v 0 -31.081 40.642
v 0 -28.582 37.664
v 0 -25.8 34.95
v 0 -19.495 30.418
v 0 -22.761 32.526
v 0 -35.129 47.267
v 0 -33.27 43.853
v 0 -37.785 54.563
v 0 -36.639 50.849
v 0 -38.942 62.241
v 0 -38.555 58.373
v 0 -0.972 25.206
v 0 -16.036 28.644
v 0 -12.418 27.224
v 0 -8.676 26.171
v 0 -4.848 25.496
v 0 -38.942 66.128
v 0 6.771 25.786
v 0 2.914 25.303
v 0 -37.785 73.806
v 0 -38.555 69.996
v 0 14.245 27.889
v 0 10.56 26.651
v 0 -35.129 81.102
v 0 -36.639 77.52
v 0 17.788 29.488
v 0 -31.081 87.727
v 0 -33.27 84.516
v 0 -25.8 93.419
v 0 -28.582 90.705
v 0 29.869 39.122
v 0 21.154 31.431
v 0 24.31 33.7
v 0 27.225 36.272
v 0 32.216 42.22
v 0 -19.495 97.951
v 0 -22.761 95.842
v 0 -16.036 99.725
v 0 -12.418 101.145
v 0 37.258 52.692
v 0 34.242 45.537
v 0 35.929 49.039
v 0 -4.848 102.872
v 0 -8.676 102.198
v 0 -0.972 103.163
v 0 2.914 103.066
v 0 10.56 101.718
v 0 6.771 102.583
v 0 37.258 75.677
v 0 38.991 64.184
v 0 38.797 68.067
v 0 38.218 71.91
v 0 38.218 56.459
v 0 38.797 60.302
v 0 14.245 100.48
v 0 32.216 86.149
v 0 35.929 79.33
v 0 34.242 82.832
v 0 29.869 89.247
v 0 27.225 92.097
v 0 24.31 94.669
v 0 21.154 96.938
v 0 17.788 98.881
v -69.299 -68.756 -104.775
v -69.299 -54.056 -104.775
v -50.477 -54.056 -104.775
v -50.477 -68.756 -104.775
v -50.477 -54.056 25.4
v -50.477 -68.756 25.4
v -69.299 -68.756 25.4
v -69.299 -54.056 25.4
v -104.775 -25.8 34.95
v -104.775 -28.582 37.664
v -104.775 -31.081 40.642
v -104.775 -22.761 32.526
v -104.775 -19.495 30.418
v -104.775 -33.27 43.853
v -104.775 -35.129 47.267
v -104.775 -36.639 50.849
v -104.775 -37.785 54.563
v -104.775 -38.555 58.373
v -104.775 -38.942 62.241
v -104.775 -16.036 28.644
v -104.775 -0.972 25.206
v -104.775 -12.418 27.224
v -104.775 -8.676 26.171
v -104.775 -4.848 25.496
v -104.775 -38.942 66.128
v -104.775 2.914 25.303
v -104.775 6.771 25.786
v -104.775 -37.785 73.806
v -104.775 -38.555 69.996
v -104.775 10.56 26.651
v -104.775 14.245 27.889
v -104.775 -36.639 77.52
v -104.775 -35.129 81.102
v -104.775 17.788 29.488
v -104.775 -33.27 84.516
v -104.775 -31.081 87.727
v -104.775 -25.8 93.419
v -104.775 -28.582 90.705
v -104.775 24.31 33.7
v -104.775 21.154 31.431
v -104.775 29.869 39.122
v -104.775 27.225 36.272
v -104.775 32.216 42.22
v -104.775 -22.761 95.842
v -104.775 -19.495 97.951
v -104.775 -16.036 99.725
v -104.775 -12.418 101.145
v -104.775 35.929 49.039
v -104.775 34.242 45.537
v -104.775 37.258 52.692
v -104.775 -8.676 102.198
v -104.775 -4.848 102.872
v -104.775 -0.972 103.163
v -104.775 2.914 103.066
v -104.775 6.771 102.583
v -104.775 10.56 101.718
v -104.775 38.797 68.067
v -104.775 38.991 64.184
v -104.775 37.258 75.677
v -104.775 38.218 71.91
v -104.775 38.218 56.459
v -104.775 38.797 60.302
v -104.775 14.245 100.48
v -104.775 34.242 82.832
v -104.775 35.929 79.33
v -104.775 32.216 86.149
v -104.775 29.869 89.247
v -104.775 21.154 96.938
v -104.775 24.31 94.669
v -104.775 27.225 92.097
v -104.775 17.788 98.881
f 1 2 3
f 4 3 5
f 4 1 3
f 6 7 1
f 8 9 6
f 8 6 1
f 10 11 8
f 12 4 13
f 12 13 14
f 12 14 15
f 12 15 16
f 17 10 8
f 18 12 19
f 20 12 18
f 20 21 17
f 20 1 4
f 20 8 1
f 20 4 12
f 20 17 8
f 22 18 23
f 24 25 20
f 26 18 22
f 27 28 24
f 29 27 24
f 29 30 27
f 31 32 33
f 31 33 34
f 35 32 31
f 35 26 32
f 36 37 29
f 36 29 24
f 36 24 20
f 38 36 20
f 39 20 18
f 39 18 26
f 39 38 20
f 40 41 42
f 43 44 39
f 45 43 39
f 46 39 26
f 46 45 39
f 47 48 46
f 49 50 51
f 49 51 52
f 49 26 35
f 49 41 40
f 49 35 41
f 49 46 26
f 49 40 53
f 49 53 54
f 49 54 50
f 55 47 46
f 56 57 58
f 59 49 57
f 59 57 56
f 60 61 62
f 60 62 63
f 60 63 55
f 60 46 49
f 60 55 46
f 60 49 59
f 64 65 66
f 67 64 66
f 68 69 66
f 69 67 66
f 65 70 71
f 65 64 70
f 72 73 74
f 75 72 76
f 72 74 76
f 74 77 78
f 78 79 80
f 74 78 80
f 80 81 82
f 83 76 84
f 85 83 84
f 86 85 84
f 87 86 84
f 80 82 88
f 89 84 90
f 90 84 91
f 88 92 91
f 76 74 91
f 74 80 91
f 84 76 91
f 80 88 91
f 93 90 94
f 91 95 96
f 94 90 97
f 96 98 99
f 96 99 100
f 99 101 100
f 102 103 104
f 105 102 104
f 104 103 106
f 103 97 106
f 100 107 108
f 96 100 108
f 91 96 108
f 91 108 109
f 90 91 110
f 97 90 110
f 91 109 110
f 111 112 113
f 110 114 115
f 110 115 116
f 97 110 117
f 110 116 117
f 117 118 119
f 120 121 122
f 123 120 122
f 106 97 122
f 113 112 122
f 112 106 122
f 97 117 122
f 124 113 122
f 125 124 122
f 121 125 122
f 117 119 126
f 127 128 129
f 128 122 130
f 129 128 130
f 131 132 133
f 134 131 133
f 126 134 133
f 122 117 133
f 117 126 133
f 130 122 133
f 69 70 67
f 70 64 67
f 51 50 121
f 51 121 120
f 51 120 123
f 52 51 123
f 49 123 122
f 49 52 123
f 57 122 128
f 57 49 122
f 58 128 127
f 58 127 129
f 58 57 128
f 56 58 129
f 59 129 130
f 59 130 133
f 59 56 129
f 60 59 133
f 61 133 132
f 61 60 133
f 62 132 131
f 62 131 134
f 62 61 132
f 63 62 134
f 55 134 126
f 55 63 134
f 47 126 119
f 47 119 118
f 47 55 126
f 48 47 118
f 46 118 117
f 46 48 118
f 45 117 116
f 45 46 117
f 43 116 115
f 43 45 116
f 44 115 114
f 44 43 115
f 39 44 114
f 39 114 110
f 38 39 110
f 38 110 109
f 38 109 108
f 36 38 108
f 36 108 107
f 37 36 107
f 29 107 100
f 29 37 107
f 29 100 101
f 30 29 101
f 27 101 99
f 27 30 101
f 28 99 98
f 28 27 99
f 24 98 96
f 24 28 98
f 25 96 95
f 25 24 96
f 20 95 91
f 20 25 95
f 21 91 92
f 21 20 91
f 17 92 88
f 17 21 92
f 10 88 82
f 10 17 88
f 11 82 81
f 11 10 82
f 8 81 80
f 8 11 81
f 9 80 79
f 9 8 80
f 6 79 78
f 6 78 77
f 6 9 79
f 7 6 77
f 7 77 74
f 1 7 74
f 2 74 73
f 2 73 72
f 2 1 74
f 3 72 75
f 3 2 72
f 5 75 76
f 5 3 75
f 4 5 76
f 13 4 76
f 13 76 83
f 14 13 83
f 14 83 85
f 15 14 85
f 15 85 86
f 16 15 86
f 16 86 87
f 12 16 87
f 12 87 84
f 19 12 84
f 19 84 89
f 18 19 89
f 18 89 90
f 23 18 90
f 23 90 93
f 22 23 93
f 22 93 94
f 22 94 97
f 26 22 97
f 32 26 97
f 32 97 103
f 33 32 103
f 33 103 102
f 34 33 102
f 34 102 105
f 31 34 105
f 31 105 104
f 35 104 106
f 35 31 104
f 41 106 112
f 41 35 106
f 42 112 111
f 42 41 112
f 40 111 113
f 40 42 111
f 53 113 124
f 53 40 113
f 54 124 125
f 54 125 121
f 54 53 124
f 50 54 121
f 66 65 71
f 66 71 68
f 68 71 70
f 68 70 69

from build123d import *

# Parameters (mm, degrees)
F0_W          = 18.8219472766
F0_H          = 14.6996676922
F1_DEPTH      = 104.775
F1_DEPTH_BACK = 25.4
F2_R          = 38.9906247572
F3_DEPTH      = 104.775


with BuildPart() as f1:
    # F0 (on Top) → F1 (new body, two sides)
    with BuildSketch(Plane.XY) as f1_sk:
        with Locations((-59.8883442581, -61.4062547684)):
            Rectangle(F0_W, F0_H)
    extrude(amount=-F1_DEPTH)
    extrude(f1_sk.sketch, amount=F1_DEPTH_BACK)


with BuildPart() as f3:
    # F2 (on Right) → F3 (new body)
    with BuildSketch(Plane.YZ):
        with Locations((0, 64.1844645143)):
            Circle(F2_R)
    extrude(amount=-F3_DEPTH)


solid = Compound([f1.part, f3.part])
